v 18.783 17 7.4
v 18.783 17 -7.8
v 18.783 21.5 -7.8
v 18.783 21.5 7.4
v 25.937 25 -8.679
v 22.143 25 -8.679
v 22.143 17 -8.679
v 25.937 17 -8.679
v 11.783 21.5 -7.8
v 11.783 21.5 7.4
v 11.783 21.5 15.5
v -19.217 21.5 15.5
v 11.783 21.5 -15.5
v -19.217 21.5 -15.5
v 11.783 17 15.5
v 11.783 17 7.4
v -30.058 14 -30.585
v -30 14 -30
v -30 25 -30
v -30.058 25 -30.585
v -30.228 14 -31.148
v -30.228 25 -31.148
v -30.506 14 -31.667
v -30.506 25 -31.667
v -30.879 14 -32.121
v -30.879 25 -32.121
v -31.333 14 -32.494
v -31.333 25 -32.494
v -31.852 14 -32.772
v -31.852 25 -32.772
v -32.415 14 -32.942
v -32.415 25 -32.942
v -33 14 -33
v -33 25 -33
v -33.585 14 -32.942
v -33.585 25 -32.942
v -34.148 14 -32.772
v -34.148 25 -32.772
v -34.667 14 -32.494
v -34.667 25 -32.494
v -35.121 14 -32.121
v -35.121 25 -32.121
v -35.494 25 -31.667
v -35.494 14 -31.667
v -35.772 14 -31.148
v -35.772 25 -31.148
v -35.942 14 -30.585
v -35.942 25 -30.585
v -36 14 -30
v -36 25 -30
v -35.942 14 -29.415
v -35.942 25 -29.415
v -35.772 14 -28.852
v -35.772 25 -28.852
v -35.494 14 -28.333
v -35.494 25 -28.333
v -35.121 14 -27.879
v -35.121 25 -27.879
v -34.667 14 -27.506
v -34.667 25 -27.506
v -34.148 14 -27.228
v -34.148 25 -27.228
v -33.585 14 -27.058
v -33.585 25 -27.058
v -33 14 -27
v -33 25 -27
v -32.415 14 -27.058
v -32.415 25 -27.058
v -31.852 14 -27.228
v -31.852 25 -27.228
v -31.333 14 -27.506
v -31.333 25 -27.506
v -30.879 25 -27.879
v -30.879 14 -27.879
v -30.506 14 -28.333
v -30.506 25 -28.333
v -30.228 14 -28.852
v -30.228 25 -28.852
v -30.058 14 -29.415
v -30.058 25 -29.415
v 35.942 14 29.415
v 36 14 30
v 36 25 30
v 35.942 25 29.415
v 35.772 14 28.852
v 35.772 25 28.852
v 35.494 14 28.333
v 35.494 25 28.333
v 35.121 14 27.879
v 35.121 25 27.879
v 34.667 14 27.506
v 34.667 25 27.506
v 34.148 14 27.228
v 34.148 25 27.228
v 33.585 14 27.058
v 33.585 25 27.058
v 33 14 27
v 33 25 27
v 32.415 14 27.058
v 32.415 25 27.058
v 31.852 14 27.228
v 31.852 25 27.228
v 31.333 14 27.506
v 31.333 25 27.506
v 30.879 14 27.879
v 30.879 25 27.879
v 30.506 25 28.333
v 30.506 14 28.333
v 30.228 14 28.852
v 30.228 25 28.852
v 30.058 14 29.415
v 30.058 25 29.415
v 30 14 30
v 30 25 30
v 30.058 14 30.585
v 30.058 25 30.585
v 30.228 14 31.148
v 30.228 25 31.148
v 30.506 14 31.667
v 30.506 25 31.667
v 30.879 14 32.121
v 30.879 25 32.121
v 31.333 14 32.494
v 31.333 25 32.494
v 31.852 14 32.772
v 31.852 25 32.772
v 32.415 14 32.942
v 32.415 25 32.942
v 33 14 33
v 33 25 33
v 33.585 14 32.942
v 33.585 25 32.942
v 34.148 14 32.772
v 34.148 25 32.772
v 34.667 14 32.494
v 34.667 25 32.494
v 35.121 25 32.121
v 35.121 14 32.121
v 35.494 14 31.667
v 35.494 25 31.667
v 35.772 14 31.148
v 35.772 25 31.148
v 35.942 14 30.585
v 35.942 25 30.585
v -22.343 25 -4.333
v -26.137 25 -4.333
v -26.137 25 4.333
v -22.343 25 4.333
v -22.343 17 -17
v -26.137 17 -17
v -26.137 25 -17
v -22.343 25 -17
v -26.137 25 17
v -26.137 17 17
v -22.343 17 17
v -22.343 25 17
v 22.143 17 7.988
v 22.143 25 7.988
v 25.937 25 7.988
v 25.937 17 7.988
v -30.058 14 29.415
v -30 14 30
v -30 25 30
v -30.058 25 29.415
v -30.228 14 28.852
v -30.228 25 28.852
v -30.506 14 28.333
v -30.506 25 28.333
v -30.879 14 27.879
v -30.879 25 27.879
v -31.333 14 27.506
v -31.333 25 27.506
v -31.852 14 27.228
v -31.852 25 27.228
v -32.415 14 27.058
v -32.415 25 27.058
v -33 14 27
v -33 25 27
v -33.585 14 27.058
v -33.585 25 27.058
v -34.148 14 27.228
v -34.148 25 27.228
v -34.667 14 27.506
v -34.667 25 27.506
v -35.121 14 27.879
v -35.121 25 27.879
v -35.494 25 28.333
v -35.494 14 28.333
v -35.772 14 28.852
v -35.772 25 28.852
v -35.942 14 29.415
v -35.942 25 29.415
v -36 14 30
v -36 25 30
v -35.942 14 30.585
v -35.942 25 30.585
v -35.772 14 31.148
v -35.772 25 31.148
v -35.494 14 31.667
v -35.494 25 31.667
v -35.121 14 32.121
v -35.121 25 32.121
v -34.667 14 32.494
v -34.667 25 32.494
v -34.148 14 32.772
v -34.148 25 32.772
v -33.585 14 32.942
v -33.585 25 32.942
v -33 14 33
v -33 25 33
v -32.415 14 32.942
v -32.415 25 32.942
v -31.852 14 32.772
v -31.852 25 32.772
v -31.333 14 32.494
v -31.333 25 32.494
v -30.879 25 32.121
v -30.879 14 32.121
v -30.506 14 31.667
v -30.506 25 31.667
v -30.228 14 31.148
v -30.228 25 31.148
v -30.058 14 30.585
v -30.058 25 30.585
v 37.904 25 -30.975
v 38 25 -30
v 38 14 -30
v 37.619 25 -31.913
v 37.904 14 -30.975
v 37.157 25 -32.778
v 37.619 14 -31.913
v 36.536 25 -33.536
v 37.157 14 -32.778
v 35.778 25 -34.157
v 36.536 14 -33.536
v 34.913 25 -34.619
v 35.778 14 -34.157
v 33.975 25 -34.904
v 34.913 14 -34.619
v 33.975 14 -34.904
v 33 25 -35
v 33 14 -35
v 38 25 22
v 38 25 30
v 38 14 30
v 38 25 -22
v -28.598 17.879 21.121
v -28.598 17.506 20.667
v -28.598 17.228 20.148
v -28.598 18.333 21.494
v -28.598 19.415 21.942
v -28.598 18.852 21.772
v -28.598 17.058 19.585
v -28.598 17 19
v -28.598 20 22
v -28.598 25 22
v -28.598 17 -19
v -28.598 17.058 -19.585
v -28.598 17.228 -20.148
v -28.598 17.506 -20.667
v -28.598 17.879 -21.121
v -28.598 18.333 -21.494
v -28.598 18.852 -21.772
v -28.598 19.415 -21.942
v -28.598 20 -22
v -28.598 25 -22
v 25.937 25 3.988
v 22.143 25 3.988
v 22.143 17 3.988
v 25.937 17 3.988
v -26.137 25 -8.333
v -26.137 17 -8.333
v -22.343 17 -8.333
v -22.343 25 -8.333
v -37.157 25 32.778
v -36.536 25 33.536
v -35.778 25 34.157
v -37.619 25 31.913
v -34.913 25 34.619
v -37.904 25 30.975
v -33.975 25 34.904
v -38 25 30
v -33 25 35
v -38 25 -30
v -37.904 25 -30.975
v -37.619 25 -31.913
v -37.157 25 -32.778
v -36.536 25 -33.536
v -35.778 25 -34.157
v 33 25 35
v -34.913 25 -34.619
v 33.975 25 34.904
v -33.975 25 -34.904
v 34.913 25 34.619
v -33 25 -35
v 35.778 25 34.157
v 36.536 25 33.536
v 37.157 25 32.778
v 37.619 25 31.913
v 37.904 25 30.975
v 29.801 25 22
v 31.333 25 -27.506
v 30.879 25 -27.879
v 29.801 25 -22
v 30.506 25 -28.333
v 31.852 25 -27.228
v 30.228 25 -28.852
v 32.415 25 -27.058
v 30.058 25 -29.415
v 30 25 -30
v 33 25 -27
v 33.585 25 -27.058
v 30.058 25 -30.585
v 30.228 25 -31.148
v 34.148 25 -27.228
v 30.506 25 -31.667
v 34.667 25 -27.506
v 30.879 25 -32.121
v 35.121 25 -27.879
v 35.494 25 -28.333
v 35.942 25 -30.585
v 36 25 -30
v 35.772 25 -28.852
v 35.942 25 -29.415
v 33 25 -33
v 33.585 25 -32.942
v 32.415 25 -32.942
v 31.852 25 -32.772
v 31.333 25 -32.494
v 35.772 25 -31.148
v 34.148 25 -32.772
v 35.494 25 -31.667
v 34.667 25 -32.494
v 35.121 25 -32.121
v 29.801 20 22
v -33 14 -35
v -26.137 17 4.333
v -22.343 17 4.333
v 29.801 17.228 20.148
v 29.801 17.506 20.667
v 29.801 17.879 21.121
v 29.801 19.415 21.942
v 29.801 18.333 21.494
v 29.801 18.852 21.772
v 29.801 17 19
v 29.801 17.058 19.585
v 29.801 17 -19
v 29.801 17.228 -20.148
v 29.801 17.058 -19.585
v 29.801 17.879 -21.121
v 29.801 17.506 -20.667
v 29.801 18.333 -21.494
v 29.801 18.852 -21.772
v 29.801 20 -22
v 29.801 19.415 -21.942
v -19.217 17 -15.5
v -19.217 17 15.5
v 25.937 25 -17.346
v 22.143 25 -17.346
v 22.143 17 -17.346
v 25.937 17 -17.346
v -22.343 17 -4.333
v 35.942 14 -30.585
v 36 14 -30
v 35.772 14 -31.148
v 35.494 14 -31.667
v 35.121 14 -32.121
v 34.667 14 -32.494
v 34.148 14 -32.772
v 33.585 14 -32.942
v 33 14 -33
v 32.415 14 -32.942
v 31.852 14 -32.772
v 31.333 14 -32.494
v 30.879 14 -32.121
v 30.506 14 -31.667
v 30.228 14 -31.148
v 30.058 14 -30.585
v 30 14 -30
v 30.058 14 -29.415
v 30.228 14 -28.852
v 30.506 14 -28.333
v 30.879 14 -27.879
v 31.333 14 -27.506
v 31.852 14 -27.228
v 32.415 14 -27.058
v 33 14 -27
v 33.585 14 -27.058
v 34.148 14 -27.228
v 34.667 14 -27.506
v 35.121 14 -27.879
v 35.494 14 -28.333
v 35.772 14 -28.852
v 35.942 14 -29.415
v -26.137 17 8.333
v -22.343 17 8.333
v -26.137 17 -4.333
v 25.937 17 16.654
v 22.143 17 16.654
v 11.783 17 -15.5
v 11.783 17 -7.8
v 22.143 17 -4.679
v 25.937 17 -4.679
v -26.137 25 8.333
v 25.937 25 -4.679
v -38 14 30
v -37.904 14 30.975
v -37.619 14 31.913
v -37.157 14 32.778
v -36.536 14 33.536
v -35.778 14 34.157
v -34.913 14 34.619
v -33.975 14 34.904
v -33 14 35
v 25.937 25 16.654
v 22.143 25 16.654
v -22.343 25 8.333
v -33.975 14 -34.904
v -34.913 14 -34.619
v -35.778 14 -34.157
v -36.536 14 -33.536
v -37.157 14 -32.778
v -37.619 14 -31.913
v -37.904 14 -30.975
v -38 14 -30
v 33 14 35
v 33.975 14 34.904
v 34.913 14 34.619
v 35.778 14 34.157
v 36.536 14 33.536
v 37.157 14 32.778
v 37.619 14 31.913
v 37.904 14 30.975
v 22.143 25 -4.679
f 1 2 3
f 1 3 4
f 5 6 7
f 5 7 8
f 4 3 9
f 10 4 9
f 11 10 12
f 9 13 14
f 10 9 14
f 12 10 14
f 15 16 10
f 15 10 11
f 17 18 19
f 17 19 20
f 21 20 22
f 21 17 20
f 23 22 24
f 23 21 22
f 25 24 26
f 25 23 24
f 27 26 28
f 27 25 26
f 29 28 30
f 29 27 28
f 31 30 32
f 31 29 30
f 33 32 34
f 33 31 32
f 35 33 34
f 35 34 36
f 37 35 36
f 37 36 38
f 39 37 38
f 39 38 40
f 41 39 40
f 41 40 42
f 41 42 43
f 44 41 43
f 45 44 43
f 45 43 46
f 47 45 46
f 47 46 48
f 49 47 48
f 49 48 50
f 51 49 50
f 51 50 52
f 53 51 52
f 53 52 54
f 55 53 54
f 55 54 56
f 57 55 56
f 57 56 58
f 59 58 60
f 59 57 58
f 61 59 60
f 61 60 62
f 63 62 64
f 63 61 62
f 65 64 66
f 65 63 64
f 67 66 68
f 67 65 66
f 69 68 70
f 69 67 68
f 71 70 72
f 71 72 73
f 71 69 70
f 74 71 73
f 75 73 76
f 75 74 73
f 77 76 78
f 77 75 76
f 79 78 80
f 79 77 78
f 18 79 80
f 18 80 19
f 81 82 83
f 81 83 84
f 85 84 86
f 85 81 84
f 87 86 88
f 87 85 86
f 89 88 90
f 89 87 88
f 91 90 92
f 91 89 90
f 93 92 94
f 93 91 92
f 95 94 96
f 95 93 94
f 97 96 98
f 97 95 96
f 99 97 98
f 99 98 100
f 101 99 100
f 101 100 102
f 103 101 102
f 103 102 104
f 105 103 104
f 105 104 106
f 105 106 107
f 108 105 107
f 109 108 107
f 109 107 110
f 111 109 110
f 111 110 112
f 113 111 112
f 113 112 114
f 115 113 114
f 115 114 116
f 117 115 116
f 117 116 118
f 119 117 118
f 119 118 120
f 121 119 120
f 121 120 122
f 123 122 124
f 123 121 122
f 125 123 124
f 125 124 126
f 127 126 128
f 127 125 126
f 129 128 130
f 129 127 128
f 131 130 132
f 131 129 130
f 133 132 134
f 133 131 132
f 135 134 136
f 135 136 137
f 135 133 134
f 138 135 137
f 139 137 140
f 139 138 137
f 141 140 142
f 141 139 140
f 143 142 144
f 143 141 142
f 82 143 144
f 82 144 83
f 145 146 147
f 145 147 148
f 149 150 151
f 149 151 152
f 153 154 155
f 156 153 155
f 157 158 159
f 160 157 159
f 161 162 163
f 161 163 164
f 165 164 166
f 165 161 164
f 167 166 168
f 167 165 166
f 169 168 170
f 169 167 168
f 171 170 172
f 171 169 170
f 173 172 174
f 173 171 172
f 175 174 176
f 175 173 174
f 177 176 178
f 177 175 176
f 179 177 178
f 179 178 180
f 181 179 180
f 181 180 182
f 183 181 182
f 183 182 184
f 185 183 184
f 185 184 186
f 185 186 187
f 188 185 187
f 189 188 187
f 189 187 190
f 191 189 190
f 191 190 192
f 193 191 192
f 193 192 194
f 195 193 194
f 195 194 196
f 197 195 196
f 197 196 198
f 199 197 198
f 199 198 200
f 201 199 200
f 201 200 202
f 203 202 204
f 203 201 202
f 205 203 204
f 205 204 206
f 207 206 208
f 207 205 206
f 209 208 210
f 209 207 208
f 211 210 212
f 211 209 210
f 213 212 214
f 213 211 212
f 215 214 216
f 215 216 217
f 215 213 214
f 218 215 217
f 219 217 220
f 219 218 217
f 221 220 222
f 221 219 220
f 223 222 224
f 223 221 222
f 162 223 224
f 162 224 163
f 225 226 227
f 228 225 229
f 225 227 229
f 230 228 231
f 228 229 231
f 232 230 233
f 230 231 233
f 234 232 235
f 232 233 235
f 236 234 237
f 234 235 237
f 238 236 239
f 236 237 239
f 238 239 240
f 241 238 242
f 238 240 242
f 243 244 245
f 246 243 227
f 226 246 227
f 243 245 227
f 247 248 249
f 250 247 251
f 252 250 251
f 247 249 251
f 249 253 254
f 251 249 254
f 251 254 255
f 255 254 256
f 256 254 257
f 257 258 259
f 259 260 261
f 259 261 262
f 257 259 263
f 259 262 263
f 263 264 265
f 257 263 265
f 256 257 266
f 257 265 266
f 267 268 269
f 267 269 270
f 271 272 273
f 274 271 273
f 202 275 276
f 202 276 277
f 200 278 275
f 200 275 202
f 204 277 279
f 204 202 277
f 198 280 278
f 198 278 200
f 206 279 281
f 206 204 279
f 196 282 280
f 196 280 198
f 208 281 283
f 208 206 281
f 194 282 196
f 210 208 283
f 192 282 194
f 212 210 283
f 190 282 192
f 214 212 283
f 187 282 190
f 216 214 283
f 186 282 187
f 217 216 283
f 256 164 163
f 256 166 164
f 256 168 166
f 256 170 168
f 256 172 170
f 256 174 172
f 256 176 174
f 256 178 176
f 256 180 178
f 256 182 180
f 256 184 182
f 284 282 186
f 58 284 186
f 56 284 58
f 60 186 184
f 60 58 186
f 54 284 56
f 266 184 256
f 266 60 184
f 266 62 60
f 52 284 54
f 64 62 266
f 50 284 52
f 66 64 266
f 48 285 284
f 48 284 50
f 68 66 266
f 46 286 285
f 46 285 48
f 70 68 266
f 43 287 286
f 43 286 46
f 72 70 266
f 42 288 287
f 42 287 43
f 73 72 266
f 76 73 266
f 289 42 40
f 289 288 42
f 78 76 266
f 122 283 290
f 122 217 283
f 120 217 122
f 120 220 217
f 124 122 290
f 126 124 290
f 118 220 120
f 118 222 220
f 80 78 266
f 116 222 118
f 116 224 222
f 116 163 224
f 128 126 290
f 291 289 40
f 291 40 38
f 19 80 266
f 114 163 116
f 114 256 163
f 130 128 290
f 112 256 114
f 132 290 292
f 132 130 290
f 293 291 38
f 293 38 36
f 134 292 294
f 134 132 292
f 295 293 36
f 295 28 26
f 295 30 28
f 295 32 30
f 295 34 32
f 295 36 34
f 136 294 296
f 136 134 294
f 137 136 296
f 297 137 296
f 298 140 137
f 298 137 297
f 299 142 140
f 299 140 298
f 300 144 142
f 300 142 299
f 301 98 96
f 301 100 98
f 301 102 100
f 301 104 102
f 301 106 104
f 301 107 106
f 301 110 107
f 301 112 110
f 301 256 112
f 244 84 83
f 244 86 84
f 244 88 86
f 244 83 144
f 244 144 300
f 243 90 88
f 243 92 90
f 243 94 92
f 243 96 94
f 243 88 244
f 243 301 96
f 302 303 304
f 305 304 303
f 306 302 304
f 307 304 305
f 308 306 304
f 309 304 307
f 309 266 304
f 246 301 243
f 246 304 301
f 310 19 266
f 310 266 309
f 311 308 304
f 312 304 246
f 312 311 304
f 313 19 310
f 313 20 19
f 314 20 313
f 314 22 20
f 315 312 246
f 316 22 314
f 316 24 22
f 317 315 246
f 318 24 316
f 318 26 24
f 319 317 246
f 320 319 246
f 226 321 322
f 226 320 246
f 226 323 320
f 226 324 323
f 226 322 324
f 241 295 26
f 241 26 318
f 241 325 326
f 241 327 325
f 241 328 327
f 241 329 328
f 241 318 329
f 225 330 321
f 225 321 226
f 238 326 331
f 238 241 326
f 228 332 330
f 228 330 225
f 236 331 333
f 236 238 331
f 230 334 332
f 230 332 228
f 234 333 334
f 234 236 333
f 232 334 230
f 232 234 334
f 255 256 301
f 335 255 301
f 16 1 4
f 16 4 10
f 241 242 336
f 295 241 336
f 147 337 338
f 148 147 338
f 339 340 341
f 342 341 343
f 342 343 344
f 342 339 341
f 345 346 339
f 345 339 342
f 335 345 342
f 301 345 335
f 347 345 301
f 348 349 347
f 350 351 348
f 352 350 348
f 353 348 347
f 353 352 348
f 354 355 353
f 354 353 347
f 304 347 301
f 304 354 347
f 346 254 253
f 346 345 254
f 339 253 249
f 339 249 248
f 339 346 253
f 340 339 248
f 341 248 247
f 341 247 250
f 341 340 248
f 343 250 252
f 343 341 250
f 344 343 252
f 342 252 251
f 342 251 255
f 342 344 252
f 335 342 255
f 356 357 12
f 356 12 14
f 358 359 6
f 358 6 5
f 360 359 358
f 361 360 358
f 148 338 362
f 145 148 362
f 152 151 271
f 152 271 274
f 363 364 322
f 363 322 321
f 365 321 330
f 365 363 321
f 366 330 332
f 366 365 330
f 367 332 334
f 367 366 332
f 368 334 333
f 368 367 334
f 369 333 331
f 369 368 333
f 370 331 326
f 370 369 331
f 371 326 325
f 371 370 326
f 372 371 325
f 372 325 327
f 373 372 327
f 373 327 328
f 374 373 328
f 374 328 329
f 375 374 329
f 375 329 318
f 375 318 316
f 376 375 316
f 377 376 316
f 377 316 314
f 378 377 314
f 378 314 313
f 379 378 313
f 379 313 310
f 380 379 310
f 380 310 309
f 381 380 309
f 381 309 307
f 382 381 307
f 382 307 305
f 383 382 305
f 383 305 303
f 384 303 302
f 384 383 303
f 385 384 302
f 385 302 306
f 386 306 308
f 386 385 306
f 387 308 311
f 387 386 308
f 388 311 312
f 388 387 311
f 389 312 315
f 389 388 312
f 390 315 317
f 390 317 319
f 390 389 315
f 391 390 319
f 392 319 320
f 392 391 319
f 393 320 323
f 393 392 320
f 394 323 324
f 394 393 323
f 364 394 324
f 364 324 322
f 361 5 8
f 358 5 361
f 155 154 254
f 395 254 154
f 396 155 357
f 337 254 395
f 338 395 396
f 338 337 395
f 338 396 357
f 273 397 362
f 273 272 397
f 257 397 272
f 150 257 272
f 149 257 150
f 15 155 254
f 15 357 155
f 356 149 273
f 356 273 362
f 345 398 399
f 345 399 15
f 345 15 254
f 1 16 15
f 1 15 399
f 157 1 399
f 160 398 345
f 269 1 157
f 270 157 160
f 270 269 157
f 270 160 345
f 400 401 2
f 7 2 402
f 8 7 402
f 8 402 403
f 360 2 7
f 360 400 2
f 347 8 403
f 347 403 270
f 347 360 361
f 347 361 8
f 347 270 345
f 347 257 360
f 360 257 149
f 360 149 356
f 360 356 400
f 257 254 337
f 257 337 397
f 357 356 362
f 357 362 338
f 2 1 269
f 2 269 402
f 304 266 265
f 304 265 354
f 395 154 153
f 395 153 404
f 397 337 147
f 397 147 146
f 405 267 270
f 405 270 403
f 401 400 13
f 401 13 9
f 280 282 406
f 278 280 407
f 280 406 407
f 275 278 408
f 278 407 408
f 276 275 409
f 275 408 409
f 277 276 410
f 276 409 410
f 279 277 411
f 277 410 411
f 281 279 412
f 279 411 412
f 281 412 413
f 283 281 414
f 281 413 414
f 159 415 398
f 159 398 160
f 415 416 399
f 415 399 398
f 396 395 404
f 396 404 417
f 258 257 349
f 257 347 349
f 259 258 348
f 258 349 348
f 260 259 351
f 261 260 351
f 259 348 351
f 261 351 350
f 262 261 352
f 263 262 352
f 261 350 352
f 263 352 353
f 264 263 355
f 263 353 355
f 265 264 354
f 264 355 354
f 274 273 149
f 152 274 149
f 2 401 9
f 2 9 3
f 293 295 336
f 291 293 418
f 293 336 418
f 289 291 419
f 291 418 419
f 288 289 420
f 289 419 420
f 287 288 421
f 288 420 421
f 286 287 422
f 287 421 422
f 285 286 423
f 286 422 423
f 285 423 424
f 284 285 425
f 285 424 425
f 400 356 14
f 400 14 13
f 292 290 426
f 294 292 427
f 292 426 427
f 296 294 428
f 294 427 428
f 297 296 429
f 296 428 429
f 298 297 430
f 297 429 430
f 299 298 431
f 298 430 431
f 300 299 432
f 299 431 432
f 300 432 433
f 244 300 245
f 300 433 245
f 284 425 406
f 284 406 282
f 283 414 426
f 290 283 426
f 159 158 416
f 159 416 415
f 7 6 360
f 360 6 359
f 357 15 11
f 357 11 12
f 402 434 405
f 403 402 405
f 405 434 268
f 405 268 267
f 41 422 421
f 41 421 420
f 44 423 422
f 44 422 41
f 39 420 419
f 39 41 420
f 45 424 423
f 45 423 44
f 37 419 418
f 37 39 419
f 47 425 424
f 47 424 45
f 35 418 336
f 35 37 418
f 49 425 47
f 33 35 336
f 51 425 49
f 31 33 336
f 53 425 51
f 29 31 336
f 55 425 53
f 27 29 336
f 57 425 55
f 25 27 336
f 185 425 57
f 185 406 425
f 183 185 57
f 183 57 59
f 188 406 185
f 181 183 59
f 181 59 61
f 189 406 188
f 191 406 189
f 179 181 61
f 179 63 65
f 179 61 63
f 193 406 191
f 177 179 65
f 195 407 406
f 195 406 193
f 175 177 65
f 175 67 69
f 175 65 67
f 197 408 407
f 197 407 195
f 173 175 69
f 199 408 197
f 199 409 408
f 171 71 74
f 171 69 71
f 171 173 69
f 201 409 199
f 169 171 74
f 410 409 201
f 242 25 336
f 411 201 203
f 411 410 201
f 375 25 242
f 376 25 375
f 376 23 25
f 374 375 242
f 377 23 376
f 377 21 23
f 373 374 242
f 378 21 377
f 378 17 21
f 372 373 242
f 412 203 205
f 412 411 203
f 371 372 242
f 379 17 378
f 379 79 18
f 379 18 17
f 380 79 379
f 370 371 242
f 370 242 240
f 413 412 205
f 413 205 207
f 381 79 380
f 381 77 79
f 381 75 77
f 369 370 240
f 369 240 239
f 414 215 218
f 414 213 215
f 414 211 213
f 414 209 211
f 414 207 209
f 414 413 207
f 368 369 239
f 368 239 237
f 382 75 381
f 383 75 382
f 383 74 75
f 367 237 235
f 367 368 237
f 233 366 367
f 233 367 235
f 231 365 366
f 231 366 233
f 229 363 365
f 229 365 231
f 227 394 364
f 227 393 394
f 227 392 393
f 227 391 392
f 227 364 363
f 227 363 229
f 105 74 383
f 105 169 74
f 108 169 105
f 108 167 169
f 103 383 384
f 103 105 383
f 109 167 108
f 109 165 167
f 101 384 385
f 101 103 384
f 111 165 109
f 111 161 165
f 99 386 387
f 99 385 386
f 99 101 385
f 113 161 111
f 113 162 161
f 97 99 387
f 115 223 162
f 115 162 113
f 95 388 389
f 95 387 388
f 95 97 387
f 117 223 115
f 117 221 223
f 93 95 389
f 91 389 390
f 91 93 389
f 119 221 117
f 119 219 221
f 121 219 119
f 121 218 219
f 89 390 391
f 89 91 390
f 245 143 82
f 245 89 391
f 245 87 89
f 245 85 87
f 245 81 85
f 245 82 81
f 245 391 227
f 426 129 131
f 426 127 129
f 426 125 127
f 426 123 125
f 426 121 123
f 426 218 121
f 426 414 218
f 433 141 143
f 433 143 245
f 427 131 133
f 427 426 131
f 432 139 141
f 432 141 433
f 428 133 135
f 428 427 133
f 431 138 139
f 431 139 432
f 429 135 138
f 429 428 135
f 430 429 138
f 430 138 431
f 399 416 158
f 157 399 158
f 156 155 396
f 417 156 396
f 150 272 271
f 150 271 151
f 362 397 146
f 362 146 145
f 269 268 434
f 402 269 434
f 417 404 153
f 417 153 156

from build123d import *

# Parameters (mm, degrees)
SKETCH2_R                        = 3
BOSS_EXTRUDE1_DEPTH              = 25
SKETCH5_W                        = 200
SKETCH5_H                        = 44
CUT_EXTRUDE1_DEPTH               = 8
SENSORMODULE_BOTTOMMIDDLEE_DEPTH = 4.5
SKETCH12_W                       = 247.875067181
SKETCH12_H                       = 102.432022038
CUT_EXTRUDE2_DEPTH               = 14
SKETCH14_W                       = 9.40210165
SKETCH14_H                       = 8
SKETCH14_W_2                     = 8.199489831
BOSS_EXTRUDE2_DEPTH              = 48
FILLET1_R                        = 3
FILLET2_R                        = 3
SKETCH15_W                       = 3.793616894
SKETCH15_H                       = 8.666666667
SKETCH15_H_2                     = 8.666666666
BOSS_EXTRUDE3_DEPTH              = 8
SKETCH16_W                       = 3.793616895
SKETCH16_H                       = 8.666666667
SKETCH16_H_2                     = 8.666666666
BOSS_EXTRUDE4_DEPTH              = 10


with BuildPart() as part:
    # Sketch2 → Boss-Extrude1 (new body)
    with BuildSketch(Plane(origin=(0, 0, 0), x_dir=(1, 0, 0), z_dir=(0, 1, 0))):
        with BuildLine():
            Line((-33, -35), (33, -35))
            ThreePointArc((33, -35), (36.535533906, -33.535533906), (38, -30))
            Line((38, -30), (38, 30))
            ThreePointArc((38, 30), (36.535533906, 33.535533906), (33, 35))
            Line((33, 35), (-33, 35))
            ThreePointArc((-33, 35), (-36.535533906, 33.535533906), (-38, 30))
            Line((-38, 30), (-38, -30))
            ThreePointArc((-38, -30), (-36.535533906, -33.535533906), (-33, -35))
        make_face()
        with Locations((-33, 30)):
            Circle(SKETCH2_R, mode=Mode.SUBTRACT)
        with Locations((-33, -30)):
            Circle(SKETCH2_R, mode=Mode.SUBTRACT)
        with Locations((33, 30)):
            Circle(SKETCH2_R, mode=Mode.SUBTRACT)
        with Locations((33, -30)):
            Circle(SKETCH2_R, mode=Mode.SUBTRACT)
    extrude(amount=BOSS_EXTRUDE1_DEPTH)

    # Sketch5 → Cut-Extrude1 (cut)
    with BuildSketch(Plane(origin=(0, 25, 0), x_dir=(1, 0, 0), z_dir=(0, 1, 0))):
        Rectangle(SKETCH5_W, SKETCH5_H)
    extrude(amount=-CUT_EXTRUDE1_DEPTH, mode=Mode.SUBTRACT)

    # Sketch6 → SensorModule(bottomMiddlee) (add)
    with BuildSketch(Plane(origin=(87.622938947, 17, 0), x_dir=(1, 0, 0), z_dir=(0, 1, 0))):
        Polygon((-106.839454309, 15.5), (-75.839454309, 15.5), (-75.839454309, 7.8), (-68.839454309, 7.8), (-68.839454309, -7.4), (-75.839454309, -7.4), (-75.839454309, -15.5), (-106.839454309, -15.5), align=None)
    extrude(amount=SENSORMODULE_BOTTOMMIDDLEE_DEPTH)

    # Sketch12 → Cut-Extrude2 (cut)
    with BuildSketch(Plane.XZ):
        with Locations((-0.926975658, -6.36803857)):
            Rectangle(SKETCH12_W, SKETCH12_H)
    extrude(amount=-CUT_EXTRUDE2_DEPTH, mode=Mode.SUBTRACT)

    # Sketch14 → Boss-Extrude2 (add)
    with BuildSketch(Plane.XY.offset(-22)):
        with Locations((-33.298949175, 21)):
            Rectangle(SKETCH14_W, SKETCH14_H)
        with Locations((33.900255085, 21)):
            Rectangle(SKETCH14_W_2, SKETCH14_H)
    extrude(amount=BOSS_EXTRUDE2_DEPTH)

    # Fillet1
    fillet1_edges = [part.edges().sort_by_distance(p)[0] for p in [
        (0.601305909, 17, -22),
    ]]
    fillet(fillet1_edges, radius=FILLET1_R)

    # Fillet2
    fillet2_edges = [part.edges().sort_by_distance(p)[0] for p in [
        (0.601305909, 17, 22),
    ]]
    fillet(fillet2_edges, radius=FILLET2_R)

    # Sketch15 → Boss-Extrude3 (add)
    with BuildSketch(Plane(origin=(3.489394794, 17, 0), x_dir=(1, 0, 0), z_dir=(0, 1, 0))):
        with Locations((-27.729371665, 12.666666666)):
            Rectangle(SKETCH15_W, SKETCH15_H)
        with Locations((-27.729371665, 0)):
            Rectangle(SKETCH15_W, SKETCH15_H_2)
        with Locations((-27.729371665, -12.666666666)):
            Rectangle(SKETCH15_W, SKETCH15_H)
    extrude(amount=BOSS_EXTRUDE3_DEPTH)

    # Sketch16 → Boss-Extrude4 (add)
    with BuildSketch(Plane(origin=(51.94610351, 25, 9.710186869), x_dir=(1, 0, 0), z_dir=(0, 1, 0))):
        with Locations((-27.906397887, 22.722574296)):
            Rectangle(SKETCH16_W, SKETCH16_H)
        with Locations((-27.906397887, 10.055907629)):
            Rectangle(SKETCH16_W, SKETCH16_H_2)
        with Locations((-27.906397887, -2.610759038)):
            Rectangle(SKETCH16_W, SKETCH16_H)
    extrude(amount=-BOSS_EXTRUDE4_DEPTH)


solid = part.part
